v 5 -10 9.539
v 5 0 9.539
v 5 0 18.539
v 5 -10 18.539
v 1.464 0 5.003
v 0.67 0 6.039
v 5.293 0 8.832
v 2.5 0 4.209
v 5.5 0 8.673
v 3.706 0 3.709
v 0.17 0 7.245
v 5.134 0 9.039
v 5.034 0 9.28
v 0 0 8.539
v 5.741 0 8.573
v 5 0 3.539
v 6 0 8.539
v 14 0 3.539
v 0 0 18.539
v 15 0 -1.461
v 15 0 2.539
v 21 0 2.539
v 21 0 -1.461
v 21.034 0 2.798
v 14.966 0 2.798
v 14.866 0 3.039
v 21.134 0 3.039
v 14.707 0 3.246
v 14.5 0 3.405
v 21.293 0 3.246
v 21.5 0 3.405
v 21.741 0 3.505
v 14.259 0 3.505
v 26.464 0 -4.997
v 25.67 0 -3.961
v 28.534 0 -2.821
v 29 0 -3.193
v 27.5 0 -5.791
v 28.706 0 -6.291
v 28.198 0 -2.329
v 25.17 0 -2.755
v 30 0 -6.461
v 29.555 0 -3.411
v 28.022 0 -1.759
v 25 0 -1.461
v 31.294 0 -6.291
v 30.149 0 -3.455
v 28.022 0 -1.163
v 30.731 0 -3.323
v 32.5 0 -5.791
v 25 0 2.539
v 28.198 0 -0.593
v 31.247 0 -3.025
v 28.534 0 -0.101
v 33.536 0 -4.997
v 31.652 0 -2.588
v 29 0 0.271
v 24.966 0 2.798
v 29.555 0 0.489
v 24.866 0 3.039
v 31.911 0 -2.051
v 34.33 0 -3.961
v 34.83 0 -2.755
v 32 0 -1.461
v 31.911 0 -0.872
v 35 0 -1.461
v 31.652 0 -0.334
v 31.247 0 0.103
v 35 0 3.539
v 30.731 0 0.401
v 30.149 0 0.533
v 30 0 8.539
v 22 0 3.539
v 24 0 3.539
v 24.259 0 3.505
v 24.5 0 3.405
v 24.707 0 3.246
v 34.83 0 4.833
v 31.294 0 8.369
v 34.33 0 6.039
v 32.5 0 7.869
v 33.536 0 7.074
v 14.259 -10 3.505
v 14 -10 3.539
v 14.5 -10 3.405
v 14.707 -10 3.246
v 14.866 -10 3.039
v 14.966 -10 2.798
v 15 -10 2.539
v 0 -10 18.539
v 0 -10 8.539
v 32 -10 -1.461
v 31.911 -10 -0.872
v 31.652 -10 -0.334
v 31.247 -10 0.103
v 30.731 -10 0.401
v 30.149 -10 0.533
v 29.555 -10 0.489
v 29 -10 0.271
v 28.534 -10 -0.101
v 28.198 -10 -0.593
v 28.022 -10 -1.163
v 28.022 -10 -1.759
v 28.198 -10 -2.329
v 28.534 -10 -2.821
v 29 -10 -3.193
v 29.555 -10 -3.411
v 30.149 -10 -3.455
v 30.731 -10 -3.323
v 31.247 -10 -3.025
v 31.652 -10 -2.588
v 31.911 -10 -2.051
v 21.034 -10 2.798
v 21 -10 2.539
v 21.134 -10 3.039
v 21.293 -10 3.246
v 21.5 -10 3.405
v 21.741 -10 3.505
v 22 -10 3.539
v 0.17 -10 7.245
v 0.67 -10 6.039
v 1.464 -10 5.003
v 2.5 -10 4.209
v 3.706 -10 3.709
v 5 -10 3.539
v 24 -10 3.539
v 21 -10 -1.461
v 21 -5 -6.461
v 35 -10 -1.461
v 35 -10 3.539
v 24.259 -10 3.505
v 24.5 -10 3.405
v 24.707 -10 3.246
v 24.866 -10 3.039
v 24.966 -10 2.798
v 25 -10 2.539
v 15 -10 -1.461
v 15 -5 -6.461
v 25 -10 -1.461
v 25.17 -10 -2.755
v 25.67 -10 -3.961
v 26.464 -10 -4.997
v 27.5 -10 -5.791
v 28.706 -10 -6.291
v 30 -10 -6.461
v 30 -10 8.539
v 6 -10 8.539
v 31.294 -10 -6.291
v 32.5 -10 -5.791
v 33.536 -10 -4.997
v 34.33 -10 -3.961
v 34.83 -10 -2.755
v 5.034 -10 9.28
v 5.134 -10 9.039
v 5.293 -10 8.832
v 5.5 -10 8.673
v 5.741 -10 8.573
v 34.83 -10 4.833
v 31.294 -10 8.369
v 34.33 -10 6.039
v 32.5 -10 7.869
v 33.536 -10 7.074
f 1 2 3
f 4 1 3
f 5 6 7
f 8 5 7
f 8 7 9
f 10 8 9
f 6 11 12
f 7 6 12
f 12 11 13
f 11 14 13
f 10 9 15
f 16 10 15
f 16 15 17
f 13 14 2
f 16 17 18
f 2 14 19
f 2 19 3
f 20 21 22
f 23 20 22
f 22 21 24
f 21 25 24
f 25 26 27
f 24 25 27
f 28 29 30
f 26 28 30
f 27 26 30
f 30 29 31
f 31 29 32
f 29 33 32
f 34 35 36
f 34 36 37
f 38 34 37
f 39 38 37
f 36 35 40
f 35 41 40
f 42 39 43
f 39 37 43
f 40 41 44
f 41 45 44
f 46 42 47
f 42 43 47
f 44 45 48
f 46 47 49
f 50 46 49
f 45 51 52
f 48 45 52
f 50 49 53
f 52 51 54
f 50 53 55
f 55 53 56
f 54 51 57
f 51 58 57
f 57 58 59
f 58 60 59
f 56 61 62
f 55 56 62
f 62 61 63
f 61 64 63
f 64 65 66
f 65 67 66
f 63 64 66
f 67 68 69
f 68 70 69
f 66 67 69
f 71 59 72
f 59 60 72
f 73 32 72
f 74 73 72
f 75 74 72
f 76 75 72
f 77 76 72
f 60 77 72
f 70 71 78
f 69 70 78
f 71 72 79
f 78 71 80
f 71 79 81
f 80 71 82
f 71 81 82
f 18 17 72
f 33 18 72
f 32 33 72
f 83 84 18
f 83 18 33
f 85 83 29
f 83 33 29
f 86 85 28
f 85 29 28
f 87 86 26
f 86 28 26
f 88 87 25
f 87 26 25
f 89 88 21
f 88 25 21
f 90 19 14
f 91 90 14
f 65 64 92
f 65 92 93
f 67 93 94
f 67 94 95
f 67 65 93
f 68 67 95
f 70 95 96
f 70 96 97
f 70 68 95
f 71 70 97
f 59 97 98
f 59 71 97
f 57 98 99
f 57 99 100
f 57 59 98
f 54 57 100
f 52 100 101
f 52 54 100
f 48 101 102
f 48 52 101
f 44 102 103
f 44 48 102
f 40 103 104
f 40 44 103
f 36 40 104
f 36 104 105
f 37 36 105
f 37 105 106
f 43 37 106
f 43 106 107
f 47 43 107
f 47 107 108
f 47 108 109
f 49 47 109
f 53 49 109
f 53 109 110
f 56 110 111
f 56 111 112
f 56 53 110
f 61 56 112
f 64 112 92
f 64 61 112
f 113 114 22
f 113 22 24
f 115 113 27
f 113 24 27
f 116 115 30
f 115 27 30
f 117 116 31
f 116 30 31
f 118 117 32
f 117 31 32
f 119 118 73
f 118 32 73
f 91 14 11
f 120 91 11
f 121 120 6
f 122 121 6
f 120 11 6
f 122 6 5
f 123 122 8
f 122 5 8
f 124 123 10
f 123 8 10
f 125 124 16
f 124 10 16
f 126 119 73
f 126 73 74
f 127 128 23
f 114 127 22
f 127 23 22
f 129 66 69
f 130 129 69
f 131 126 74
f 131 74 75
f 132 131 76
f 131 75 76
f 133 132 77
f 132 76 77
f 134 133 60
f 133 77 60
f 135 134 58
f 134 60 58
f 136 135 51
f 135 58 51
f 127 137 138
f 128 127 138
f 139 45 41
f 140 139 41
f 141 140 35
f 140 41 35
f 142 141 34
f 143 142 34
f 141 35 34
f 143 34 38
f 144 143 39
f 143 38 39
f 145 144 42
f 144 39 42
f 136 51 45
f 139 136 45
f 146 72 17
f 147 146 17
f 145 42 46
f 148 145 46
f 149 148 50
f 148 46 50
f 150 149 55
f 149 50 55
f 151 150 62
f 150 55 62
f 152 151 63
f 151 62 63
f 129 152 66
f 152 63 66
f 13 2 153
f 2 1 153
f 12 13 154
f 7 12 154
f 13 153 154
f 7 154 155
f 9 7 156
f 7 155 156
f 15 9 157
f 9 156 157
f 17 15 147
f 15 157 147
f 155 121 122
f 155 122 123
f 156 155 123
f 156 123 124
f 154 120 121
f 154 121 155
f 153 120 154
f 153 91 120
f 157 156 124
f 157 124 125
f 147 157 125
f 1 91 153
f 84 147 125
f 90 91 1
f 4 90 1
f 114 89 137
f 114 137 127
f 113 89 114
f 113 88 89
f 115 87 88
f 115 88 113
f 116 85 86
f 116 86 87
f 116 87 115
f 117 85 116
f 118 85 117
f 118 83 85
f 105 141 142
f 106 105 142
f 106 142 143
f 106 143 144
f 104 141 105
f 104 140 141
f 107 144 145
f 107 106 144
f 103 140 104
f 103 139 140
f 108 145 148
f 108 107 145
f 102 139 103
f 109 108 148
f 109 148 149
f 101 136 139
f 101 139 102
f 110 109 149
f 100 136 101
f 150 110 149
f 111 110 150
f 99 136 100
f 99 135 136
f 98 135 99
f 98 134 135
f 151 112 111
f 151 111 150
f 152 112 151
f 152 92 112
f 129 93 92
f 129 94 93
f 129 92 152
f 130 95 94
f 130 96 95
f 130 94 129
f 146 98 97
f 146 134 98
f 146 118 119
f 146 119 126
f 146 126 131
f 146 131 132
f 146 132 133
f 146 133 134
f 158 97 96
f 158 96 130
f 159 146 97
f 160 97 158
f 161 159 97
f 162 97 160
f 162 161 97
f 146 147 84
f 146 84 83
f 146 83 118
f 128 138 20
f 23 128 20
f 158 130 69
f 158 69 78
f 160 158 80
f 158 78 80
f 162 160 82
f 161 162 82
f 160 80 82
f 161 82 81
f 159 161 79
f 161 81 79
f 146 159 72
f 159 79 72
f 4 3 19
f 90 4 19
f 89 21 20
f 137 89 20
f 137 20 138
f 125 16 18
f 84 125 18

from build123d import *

# Parameters (mm, degrees)
F0_R     = 2
F1_DEPTH = 10
F2_R     = 1
F4_DEPTH = 6


with BuildPart() as f1:
    # F0 (on Front) → F1 (new body)
    with BuildSketch(Plane.XZ):
        with BuildLine():
            Line((5, 18.538928), (0, 18.538928))
            Line((0, 18.538928), (0, 8.538928))
            ThreePointArc((0, 8.538928), (1.464466, 5.003394), (5, 3.538928))
            Line((5, 3.538928), (14, 3.538928))
            ThreePointArc((14, 3.538928), (14.707107, 3.246035), (15, 2.538928))
            Line((15, 2.538928), (15, -6.461072))
            Line((15, -6.461072), (21, -6.461072))
            Line((21, -6.461072), (21, 2.538928))
            ThreePointArc((21, 2.538928), (21.292893, 3.246035), (22, 3.538928))
            Line((22, 3.538928), (24, 3.538928))
            ThreePointArc((24, 3.538928), (24.707107, 3.246035), (25, 2.538928))
            Line((25, 2.538928), (25, -1.461072))
            ThreePointArc((25, -1.461072), (26.464466, -4.996606), (30, -6.461072))
            ThreePointArc((30, -6.461072), (33.535534, -4.996606), (35, -1.461072))
            Line((35, -1.461072), (35, 3.538928))
            ThreePointArc((35, 3.538928), (33.535534, 7.074462), (30, 8.538928))
            Line((30, 8.538928), (5, 8.538928))
            Line((5, 8.538928), (5, 18.538928))
        make_face()
        with Locations((30, -1.461072)):
            Circle(F0_R, mode=Mode.SUBTRACT)
    extrude(amount=F1_DEPTH)

    # F2
    f2_edges = [f1.edges().sort_by_distance(p)[0] for p in [
        (5, -5, 8.538928),
    ]]
    fillet(f2_edges, radius=F2_R)

    # F3 (on face) → F4 (cut)
    with BuildSketch(Plane(origin=(15, 0, 0), x_dir=(0, -1, 0), z_dir=(-1, 0, 0))):
        Polygon((0, -6.461072), (5, -6.461072), (0, -1.461072), align=None)
        Polygon((10, -1.461072), (5, -6.461072), (10, -6.461072), align=None)
    extrude(amount=-F4_DEPTH, mode=Mode.SUBTRACT)


solid = f1.part
